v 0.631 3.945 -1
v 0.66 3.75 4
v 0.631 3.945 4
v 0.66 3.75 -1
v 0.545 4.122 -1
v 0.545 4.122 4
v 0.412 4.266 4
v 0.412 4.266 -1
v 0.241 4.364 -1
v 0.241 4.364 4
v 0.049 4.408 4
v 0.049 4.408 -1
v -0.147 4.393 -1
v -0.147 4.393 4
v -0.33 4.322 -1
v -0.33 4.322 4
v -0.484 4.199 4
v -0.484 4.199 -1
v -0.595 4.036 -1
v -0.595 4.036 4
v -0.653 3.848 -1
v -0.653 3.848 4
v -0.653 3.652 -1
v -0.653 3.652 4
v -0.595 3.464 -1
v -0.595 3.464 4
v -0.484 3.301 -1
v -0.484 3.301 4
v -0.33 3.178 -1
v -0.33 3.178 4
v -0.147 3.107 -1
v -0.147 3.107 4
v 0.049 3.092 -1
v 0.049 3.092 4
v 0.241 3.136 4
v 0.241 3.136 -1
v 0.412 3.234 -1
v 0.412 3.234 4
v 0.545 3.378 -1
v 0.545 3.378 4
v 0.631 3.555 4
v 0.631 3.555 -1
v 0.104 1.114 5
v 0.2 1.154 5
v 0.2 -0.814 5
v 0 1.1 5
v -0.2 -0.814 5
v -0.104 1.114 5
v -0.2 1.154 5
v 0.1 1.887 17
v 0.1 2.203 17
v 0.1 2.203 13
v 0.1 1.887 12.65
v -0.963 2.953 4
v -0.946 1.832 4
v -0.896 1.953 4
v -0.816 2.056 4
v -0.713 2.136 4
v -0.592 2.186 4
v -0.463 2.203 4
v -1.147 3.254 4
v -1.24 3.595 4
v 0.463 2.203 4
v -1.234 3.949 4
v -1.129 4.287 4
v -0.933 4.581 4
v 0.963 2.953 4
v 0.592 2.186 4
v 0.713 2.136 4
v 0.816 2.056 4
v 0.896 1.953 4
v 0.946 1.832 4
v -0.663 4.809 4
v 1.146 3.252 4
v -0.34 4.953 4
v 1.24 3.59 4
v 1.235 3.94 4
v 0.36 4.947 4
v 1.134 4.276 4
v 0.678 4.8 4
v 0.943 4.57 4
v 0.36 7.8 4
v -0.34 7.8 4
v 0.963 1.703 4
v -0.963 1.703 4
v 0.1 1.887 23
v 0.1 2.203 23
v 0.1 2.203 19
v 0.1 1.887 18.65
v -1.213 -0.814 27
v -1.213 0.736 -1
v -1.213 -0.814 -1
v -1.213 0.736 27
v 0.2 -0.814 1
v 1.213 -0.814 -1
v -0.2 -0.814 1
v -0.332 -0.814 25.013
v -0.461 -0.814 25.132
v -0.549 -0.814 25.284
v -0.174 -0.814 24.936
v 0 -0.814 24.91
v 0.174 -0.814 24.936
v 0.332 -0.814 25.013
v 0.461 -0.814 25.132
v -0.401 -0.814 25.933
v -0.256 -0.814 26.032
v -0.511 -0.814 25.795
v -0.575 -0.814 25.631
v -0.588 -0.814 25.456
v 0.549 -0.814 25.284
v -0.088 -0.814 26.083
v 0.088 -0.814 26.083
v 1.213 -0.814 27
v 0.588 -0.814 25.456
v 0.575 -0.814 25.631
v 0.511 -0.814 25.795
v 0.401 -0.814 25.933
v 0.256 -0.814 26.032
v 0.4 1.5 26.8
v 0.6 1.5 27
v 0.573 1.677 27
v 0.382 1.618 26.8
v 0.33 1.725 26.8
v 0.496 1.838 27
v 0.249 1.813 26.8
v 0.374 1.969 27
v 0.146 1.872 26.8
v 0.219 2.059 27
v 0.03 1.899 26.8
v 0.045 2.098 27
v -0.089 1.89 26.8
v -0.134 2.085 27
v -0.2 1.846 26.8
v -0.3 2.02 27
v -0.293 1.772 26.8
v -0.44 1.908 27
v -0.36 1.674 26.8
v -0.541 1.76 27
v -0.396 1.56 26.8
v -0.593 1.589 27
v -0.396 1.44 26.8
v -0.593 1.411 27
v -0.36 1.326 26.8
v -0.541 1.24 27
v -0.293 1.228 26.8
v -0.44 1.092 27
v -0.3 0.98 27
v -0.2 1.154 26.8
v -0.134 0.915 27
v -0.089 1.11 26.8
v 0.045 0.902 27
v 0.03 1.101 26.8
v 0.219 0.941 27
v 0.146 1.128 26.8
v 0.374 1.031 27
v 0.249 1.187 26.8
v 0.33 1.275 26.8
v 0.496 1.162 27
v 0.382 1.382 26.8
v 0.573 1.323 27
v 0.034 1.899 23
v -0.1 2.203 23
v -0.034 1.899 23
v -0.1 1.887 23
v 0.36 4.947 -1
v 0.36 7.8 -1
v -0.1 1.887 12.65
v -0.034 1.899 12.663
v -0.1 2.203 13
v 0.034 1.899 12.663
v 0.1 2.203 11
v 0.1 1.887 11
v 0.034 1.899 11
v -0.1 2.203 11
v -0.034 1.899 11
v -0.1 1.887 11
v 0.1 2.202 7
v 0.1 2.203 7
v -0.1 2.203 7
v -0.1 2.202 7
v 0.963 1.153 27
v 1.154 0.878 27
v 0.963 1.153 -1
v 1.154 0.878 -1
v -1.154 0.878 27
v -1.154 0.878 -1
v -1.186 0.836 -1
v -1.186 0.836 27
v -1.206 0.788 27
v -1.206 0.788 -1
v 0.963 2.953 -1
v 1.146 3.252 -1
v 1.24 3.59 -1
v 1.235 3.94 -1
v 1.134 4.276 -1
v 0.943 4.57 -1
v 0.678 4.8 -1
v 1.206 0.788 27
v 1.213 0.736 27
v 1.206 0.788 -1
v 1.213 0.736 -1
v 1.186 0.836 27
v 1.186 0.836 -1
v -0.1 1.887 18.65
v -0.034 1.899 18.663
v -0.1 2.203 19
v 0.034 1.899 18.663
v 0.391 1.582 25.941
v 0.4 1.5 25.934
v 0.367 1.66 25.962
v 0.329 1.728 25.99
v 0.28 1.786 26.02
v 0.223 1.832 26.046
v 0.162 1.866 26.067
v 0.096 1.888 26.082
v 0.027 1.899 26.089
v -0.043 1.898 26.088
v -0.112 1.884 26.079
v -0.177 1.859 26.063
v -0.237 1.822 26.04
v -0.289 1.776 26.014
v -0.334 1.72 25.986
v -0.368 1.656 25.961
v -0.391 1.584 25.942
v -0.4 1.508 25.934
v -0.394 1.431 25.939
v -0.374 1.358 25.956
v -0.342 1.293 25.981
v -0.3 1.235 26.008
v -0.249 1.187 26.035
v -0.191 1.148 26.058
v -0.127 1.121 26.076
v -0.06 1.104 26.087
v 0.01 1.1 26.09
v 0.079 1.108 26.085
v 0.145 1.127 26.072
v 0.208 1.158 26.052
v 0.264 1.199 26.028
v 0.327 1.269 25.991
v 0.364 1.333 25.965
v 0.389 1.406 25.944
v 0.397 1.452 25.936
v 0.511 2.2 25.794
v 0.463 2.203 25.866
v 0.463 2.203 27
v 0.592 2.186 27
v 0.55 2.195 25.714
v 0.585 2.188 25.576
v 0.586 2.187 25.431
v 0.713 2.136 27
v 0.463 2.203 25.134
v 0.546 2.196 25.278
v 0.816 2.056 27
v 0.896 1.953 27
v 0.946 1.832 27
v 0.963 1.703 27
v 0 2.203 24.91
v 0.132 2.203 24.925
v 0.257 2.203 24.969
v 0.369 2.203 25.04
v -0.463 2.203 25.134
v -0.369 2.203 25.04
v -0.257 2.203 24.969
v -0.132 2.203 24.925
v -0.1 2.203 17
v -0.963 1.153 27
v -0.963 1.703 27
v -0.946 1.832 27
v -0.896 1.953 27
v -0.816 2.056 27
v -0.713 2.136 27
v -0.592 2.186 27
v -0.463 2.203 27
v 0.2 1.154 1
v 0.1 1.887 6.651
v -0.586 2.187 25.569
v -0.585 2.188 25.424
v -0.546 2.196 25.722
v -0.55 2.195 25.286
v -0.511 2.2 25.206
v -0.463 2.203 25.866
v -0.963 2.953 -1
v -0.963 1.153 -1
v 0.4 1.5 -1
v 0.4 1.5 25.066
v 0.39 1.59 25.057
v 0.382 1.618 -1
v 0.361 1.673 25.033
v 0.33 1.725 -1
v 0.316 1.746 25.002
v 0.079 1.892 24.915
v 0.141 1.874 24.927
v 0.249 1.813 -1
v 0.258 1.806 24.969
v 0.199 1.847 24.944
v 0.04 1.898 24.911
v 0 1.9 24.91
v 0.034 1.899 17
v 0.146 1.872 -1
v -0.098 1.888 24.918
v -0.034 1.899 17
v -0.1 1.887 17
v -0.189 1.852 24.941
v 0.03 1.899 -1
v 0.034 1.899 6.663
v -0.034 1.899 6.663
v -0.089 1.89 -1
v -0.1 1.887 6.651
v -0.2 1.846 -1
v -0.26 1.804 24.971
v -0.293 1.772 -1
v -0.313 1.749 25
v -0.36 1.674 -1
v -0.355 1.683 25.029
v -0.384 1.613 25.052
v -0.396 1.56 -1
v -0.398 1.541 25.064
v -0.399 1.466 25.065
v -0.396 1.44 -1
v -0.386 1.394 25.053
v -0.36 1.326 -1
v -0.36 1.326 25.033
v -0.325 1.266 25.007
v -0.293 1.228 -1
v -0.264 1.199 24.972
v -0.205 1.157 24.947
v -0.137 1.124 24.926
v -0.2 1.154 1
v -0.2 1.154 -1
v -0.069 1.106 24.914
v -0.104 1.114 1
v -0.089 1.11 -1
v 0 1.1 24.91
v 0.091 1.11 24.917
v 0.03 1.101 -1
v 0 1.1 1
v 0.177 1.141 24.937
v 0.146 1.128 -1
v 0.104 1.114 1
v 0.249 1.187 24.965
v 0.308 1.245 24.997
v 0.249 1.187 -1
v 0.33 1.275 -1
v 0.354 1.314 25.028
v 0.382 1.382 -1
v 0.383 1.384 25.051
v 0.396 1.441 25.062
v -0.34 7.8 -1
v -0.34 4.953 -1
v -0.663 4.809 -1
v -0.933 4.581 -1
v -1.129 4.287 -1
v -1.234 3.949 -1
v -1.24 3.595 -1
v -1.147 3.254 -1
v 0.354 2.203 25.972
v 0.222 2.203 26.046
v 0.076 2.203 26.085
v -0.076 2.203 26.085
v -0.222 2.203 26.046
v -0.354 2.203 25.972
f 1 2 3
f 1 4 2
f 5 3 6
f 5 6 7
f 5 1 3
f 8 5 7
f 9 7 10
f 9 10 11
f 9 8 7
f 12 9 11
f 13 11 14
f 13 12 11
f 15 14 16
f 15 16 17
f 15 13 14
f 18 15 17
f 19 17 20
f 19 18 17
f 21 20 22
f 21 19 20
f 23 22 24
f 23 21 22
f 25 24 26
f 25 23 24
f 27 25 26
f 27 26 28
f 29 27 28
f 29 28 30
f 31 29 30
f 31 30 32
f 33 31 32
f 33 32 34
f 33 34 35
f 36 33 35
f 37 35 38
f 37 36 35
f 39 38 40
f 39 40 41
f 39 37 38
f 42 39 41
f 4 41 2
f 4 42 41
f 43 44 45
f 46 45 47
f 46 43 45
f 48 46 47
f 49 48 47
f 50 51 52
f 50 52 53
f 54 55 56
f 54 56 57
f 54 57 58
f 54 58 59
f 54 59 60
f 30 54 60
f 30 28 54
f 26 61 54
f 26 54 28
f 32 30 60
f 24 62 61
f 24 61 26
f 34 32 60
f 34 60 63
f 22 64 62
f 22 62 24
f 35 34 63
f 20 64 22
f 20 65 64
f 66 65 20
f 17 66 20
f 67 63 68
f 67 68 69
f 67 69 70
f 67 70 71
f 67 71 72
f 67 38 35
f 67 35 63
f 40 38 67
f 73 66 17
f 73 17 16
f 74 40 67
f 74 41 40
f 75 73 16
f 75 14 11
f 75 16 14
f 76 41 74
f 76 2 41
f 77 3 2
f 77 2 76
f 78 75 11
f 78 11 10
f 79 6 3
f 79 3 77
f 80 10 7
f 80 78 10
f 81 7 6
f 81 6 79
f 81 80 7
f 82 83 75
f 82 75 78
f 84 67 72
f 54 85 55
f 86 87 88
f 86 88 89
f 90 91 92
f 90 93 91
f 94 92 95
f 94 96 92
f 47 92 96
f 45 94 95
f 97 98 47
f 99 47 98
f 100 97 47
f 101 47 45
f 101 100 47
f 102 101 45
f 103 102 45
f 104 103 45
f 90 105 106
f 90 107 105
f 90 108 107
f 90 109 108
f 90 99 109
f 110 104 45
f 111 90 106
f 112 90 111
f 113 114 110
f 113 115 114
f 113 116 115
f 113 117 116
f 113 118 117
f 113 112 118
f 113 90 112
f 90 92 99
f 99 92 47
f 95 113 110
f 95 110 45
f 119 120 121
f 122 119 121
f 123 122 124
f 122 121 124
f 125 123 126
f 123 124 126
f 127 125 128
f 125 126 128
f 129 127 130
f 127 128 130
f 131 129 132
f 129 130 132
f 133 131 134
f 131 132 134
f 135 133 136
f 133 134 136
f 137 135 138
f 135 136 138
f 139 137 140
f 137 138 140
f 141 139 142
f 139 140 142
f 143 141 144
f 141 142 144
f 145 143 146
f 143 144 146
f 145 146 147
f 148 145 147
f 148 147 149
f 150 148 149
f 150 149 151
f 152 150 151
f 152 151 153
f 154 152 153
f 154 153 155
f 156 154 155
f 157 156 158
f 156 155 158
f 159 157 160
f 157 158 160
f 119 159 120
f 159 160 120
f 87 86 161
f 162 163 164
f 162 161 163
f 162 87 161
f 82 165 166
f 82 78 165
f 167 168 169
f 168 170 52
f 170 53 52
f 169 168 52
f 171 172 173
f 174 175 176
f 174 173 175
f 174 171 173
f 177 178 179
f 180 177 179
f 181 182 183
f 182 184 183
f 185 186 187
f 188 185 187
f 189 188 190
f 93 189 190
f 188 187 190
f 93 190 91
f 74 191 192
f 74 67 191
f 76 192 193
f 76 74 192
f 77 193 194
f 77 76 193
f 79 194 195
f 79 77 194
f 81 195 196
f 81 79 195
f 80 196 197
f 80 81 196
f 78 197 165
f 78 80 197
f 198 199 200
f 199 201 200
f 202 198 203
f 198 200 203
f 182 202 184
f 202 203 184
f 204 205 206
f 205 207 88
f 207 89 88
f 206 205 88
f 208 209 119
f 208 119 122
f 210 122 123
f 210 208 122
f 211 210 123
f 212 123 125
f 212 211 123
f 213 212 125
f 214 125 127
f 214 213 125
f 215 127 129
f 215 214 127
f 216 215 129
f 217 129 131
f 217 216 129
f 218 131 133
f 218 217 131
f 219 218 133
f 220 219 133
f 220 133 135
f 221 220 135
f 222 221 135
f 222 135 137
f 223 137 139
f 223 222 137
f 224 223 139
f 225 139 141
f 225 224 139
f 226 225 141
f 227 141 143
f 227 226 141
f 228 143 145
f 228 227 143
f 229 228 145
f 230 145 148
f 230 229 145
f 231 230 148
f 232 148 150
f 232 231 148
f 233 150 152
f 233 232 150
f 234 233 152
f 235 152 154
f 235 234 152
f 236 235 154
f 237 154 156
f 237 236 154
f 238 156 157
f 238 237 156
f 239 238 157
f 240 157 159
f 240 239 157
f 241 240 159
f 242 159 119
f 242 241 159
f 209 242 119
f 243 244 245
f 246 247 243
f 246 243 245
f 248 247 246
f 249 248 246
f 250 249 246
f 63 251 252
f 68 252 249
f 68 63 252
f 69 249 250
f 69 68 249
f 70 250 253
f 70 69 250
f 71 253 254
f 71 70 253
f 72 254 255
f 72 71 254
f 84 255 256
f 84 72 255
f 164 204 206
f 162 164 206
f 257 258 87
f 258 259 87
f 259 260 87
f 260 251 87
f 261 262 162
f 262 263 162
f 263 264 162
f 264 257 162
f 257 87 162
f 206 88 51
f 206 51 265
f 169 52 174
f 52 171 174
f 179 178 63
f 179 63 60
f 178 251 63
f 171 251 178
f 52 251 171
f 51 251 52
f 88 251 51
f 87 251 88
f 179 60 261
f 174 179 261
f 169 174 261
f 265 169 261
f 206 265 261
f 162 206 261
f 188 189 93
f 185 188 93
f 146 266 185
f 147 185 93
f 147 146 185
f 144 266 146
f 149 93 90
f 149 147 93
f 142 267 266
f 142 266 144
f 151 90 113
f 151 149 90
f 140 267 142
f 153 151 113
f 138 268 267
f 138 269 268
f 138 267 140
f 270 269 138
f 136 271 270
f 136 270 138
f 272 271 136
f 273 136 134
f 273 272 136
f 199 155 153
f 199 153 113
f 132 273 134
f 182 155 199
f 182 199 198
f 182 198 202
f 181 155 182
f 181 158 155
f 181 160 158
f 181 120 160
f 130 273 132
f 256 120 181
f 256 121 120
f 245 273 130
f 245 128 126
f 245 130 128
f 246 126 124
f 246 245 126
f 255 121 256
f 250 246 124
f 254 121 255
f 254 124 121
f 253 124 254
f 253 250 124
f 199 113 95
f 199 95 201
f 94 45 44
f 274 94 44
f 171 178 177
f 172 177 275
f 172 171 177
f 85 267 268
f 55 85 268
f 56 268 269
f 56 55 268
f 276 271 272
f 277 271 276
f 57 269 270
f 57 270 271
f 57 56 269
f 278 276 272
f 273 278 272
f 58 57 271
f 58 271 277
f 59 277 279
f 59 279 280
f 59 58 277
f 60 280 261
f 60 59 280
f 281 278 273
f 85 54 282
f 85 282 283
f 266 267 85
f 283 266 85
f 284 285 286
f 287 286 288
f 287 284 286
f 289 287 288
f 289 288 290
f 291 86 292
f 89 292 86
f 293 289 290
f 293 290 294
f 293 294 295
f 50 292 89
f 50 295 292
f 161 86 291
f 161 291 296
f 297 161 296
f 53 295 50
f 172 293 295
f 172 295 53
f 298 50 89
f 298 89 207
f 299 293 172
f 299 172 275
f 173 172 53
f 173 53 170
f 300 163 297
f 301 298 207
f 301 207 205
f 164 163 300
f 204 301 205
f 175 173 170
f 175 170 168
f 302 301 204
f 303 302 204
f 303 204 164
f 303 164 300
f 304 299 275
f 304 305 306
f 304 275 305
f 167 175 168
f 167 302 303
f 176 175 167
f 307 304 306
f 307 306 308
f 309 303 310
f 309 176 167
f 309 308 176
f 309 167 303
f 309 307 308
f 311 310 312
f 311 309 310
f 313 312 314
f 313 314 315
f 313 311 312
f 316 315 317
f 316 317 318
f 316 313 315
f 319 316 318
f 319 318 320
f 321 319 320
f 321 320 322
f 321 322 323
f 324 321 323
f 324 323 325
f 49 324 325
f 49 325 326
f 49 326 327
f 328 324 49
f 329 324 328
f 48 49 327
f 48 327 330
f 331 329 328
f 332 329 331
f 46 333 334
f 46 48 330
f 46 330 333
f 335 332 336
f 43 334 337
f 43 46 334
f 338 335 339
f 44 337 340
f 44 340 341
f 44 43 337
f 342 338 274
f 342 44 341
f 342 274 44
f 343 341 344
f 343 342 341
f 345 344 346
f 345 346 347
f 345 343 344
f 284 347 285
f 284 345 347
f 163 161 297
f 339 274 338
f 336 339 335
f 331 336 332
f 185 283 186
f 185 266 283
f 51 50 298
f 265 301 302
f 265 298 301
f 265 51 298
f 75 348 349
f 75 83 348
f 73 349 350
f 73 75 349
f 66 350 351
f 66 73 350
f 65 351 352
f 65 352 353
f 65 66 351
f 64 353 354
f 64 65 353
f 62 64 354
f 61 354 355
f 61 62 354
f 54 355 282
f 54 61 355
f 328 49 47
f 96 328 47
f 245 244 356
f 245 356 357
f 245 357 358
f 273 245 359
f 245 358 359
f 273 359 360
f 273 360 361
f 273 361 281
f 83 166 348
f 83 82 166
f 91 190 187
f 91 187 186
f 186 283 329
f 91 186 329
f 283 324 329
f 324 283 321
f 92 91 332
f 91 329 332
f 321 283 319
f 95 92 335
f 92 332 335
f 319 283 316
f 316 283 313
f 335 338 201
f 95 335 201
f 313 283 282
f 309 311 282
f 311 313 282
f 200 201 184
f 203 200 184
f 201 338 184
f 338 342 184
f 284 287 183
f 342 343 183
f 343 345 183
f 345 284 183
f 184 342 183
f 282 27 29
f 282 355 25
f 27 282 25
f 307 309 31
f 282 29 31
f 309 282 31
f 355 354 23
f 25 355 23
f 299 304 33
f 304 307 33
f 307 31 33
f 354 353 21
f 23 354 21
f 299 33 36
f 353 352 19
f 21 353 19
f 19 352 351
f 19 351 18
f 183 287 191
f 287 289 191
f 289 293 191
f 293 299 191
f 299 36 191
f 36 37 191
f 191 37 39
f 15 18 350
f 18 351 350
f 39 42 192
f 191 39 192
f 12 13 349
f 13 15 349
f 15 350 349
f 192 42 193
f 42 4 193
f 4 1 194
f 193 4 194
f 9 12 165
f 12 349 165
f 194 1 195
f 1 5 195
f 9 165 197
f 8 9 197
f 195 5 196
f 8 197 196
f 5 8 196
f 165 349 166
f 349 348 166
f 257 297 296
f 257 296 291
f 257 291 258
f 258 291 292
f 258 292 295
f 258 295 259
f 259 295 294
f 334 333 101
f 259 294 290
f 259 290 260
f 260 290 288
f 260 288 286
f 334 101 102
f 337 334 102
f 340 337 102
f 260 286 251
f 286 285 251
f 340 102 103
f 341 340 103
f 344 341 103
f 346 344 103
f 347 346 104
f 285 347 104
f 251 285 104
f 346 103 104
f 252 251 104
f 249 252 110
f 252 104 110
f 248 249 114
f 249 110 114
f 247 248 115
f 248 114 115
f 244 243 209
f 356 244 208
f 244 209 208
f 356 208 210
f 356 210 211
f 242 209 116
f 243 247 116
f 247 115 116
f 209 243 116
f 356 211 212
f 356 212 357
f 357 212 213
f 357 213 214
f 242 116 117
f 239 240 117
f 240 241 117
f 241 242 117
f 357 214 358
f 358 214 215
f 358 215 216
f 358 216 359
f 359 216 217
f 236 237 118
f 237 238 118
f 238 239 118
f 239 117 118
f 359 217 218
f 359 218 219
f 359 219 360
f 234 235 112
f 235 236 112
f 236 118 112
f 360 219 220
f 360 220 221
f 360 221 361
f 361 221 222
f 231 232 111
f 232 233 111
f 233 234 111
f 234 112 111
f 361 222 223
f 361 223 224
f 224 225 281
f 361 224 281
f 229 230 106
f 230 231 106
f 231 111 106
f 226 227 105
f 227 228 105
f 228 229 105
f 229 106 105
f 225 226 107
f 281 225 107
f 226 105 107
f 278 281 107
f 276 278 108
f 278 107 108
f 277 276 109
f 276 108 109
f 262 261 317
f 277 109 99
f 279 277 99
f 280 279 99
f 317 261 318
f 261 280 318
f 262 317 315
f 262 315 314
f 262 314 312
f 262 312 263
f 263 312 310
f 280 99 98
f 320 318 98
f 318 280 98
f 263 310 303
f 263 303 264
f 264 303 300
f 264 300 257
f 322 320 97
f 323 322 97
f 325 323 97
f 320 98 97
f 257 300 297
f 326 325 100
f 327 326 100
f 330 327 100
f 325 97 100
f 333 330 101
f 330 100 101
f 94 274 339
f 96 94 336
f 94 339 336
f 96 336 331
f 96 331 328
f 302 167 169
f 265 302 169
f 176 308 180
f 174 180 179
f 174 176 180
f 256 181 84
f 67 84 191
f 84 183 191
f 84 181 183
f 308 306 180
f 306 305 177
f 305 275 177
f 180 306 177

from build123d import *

# Parameters (mm, degrees)
SKETCH1_R                = 0.66
SKETCH1_R_2              = 0.4
BOSS_EXTRUDE1_DEPTH      = 4
BOSS_EXTRUDE1_DEPTH_BACK = 1
BOSS_EXTRUDE2_DEPTH      = 20
SKETCH8_R                = 0.4
BOSS_EXTRUDE3_DEPTH      = 3
BOSS_EXTRUDE3_DEPTH_BACK = 20
FILLET1_R                = 0.5
CUT_EXTRUDE4_START       = -4
CUT_EXTRUDE4_DEPTH       = 4
CUT_EXTRUDE5_START       = -10
CUT_EXTRUDE5_DEPTH       = 4
CUT_EXTRUDE6_START       = -16
CUT_EXTRUDE6_DEPTH       = 4
CUT_EXTRUDE7_DEPTH       = 0.2
CHAMFER1_SIZE            = 0.2
CUT_EXTRUDE9_START       = -22
CUT_EXTRUDE9_DEPTH       = 4
SKETCH17_R               = 0.59
CUT_EXTRUDE11_DEPTH      = 9.61358644


with BuildPart() as part:
    # Sketch1 → Boss-Extrude1 (new body, two sides)
    with BuildSketch(Plane.XY) as boss_extrude1_sk:
        with BuildLine():
            Line((-0.962751438, 1.153198745), (-1.154172794, 0.877795696))
            ThreePointArc((-1.154172794, 0.877795696), (-1.197527345, 0.812911026), (-1.212751438, 0.73637434))
            Line((-1.212751438, 0.73637434), (-1.212751438, -0.81362566))
            Line((-1.212751438, -0.81362566), (0.95, -0.81362566))
            Line((0.95, -0.81362566), (1.2, -0.81362566))
            Line((1.2, -0.81362566), (1.212751438, -0.81362566))
            Line((1.212751438, -0.81362566), (1.212751438, 0.73637434))
            ThreePointArc((1.212751438, 0.73637434), (1.197527345, 0.812911026), (1.154172794, 0.877795696))
            Line((1.154172794, 0.877795696), (0.962751438, 1.153198745))
            Line((0.962751438, 1.153198745), (0.962751438, 2.952748679))
            ThreePointArc((0.962751438, 2.952748679), (1.196528268, 4.111690618), (0.359901995, 4.947067481))
            Line((0.359901995, 4.947067481), (0.359901995, 7.79996078))
            Line((0.359901995, 7.79996078), (-0.340098005, 7.79996078))
            Line((-0.340098005, 7.79996078), (-0.340098005, 4.952843858))
            ThreePointArc((-0.340098005, 4.952843858), (-1.193502974, 4.12155168), (-0.962751438, 2.952748679))
            Line((-0.962751438, 2.952748679), (-0.962751438, 1.153198745))
        make_face()
        with Locations((0, 3.75)):
            Circle(SKETCH1_R, mode=Mode.SUBTRACT)
        with Locations((0, 1.5)):
            Circle(SKETCH1_R_2, mode=Mode.SUBTRACT)
    extrude(amount=BOSS_EXTRUDE1_DEPTH)
    extrude(boss_extrude1_sk.sketch, amount=-BOSS_EXTRUDE1_DEPTH_BACK)

    # Sketch7 → Boss-Extrude2 (add)
    with BuildSketch(Plane.XY.offset(4)):
        with BuildLine():
            Line((-1.154172794, 0.877795696), (1.154172794, 0.877795696))
            ThreePointArc((1.154172794, 0.877795696), (1.197527345, 0.812911026), (1.212751438, 0.73637434))
            Line((1.212751438, 0.73637434), (1.212751438, -0.81362566))
            Line((1.212751438, -0.81362566), (-1.212751438, -0.81362566))
            Line((-1.212751438, -0.81362566), (-1.212751438, 0.73637434))
            ThreePointArc((-1.212751438, 0.73637434), (-1.197527345, 0.812911026), (-1.154172794, 0.877795696))
        make_face()
    extrude(amount=BOSS_EXTRUDE2_DEPTH)

    # Sketch8 → Boss-Extrude3 (add, two sides)
    with BuildSketch(Plane.XY.offset(24)) as boss_extrude3_sk:
        with BuildLine():
            Line((-1.212751438, 0.73637434), (-1.212751438, -0.81362566))
            Line((-1.212751438, -0.81362566), (1.212751438, -0.81362566))
            Line((1.212751438, -0.81362566), (1.212751438, 0.73637434))
            ThreePointArc((1.212751438, 0.73637434), (1.197527345, 0.812911026), (1.154172794, 0.877795696))
            Line((1.154172794, 0.877795696), (0.962751438, 1.153198745))
            Line((0.962751438, 1.153198745), (0.962751438, 2.202748679))
            Line((0.962751438, 2.202748679), (-0.962751438, 2.202748679))
            Line((-0.962751438, 2.202748679), (-0.962751438, 1.153198745))
            Line((-0.962751438, 1.153198745), (-1.154172794, 0.877795696))
            ThreePointArc((-1.154172794, 0.877795696), (-1.197527345, 0.812911026), (-1.212751438, 0.73637434))
        make_face()
        with Locations((0, 1.5)):
            Circle(SKETCH8_R, mode=Mode.SUBTRACT)
    extrude(amount=BOSS_EXTRUDE3_DEPTH)
    extrude(boss_extrude3_sk.sketch, amount=-BOSS_EXTRUDE3_DEPTH_BACK)

    # Fillet1
    fillet1_edges = [part.edges().sort_by_distance(p)[0] for p in [
        (-0.962751438, 2.202748679, 15.5),
        (0.962751438, 2.202748679, 15.5),
    ]]
    fillet(fillet1_edges, radius=FILLET1_R)

    # Sketch10 → Cut-Extrude4 (cut)
    with BuildSketch(Plane.XY.offset(27).offset(CUT_EXTRUDE4_START)):
        Polygon((0, 2.202748679), (0.1, 2.202748679), (0.1, 1.887298335), (-0.1, 1.887298335), (-0.1, 2.202748679), align=None)
    extrude(amount=-CUT_EXTRUDE4_DEPTH, mode=Mode.SUBTRACT)

    # Sketch10_2 → Cut-Extrude5 (cut)
    with BuildSketch(Plane.XY.offset(27).offset(CUT_EXTRUDE5_START)):
        Polygon((0, 2.202748679), (0.1, 2.202748679), (0.1, 1.887298335), (-0.1, 1.887298335), (-0.1, 2.202748679), align=None)
    extrude(amount=-CUT_EXTRUDE5_DEPTH, mode=Mode.SUBTRACT)

    # Sketch10_3 → Cut-Extrude6 (cut)
    with BuildSketch(Plane.XY.offset(27).offset(CUT_EXTRUDE6_START)):
        Polygon((0, 2.202748679), (0.1, 2.202748679), (0.1, 1.887298335), (-0.1, 1.887298335), (-0.1, 2.202748679), align=None)
    extrude(amount=-CUT_EXTRUDE6_DEPTH, mode=Mode.SUBTRACT)

    # Sketch11 → Cut-Extrude7 (cut)
    with BuildSketch(Plane.ZY.offset(-0.1)):
        Polygon((13, 2.202748679), (13, 1.887298335), (12.65, 1.887298335), align=None)
        Polygon((19, 2.202748679), (19, 1.887298335), (18.65, 1.887298335), align=None)
        Polygon((7.000738825, 2.202748679), (7.000738825, 1.887298335), (6.650738825, 1.887298335), align=None)
    extrude(amount=CUT_EXTRUDE7_DEPTH, mode=Mode.SUBTRACT)

    # Chamfer1
    chamfer1_edges = [part.edges().sort_by_distance(p)[0] for p in [
        (-0.4, 1.5, 27),
    ]]
    chamfer(chamfer1_edges, length=CHAMFER1_SIZE)

    # Sketch14 → Cut-Extrude9 (cut)
    with BuildSketch(Plane.XY.offset(27).offset(CUT_EXTRUDE9_START)):
        Polygon((0.2, 1.1), (0.2, -0.81362566), (-0.2, -0.81362566), (-0.2, 1.1), (-0.2, 1.254612966), (0, 1.254612966), (0.2, 1.254612966), align=None)
    extrude(amount=-CUT_EXTRUDE9_DEPTH, mode=Mode.SUBTRACT)

    # Sketch17 → Cut-Extrude11 (cut, through all)
    with BuildSketch(Plane.XZ.offset(0.81362566)):
        with Locations(Location((0, 25.5, 0), (0, 0, 270))):  # turned: the seam where the file's is
            Circle(SKETCH17_R)
    extrude(amount=-CUT_EXTRUDE11_DEPTH, mode=Mode.SUBTRACT)


solid = part.part
